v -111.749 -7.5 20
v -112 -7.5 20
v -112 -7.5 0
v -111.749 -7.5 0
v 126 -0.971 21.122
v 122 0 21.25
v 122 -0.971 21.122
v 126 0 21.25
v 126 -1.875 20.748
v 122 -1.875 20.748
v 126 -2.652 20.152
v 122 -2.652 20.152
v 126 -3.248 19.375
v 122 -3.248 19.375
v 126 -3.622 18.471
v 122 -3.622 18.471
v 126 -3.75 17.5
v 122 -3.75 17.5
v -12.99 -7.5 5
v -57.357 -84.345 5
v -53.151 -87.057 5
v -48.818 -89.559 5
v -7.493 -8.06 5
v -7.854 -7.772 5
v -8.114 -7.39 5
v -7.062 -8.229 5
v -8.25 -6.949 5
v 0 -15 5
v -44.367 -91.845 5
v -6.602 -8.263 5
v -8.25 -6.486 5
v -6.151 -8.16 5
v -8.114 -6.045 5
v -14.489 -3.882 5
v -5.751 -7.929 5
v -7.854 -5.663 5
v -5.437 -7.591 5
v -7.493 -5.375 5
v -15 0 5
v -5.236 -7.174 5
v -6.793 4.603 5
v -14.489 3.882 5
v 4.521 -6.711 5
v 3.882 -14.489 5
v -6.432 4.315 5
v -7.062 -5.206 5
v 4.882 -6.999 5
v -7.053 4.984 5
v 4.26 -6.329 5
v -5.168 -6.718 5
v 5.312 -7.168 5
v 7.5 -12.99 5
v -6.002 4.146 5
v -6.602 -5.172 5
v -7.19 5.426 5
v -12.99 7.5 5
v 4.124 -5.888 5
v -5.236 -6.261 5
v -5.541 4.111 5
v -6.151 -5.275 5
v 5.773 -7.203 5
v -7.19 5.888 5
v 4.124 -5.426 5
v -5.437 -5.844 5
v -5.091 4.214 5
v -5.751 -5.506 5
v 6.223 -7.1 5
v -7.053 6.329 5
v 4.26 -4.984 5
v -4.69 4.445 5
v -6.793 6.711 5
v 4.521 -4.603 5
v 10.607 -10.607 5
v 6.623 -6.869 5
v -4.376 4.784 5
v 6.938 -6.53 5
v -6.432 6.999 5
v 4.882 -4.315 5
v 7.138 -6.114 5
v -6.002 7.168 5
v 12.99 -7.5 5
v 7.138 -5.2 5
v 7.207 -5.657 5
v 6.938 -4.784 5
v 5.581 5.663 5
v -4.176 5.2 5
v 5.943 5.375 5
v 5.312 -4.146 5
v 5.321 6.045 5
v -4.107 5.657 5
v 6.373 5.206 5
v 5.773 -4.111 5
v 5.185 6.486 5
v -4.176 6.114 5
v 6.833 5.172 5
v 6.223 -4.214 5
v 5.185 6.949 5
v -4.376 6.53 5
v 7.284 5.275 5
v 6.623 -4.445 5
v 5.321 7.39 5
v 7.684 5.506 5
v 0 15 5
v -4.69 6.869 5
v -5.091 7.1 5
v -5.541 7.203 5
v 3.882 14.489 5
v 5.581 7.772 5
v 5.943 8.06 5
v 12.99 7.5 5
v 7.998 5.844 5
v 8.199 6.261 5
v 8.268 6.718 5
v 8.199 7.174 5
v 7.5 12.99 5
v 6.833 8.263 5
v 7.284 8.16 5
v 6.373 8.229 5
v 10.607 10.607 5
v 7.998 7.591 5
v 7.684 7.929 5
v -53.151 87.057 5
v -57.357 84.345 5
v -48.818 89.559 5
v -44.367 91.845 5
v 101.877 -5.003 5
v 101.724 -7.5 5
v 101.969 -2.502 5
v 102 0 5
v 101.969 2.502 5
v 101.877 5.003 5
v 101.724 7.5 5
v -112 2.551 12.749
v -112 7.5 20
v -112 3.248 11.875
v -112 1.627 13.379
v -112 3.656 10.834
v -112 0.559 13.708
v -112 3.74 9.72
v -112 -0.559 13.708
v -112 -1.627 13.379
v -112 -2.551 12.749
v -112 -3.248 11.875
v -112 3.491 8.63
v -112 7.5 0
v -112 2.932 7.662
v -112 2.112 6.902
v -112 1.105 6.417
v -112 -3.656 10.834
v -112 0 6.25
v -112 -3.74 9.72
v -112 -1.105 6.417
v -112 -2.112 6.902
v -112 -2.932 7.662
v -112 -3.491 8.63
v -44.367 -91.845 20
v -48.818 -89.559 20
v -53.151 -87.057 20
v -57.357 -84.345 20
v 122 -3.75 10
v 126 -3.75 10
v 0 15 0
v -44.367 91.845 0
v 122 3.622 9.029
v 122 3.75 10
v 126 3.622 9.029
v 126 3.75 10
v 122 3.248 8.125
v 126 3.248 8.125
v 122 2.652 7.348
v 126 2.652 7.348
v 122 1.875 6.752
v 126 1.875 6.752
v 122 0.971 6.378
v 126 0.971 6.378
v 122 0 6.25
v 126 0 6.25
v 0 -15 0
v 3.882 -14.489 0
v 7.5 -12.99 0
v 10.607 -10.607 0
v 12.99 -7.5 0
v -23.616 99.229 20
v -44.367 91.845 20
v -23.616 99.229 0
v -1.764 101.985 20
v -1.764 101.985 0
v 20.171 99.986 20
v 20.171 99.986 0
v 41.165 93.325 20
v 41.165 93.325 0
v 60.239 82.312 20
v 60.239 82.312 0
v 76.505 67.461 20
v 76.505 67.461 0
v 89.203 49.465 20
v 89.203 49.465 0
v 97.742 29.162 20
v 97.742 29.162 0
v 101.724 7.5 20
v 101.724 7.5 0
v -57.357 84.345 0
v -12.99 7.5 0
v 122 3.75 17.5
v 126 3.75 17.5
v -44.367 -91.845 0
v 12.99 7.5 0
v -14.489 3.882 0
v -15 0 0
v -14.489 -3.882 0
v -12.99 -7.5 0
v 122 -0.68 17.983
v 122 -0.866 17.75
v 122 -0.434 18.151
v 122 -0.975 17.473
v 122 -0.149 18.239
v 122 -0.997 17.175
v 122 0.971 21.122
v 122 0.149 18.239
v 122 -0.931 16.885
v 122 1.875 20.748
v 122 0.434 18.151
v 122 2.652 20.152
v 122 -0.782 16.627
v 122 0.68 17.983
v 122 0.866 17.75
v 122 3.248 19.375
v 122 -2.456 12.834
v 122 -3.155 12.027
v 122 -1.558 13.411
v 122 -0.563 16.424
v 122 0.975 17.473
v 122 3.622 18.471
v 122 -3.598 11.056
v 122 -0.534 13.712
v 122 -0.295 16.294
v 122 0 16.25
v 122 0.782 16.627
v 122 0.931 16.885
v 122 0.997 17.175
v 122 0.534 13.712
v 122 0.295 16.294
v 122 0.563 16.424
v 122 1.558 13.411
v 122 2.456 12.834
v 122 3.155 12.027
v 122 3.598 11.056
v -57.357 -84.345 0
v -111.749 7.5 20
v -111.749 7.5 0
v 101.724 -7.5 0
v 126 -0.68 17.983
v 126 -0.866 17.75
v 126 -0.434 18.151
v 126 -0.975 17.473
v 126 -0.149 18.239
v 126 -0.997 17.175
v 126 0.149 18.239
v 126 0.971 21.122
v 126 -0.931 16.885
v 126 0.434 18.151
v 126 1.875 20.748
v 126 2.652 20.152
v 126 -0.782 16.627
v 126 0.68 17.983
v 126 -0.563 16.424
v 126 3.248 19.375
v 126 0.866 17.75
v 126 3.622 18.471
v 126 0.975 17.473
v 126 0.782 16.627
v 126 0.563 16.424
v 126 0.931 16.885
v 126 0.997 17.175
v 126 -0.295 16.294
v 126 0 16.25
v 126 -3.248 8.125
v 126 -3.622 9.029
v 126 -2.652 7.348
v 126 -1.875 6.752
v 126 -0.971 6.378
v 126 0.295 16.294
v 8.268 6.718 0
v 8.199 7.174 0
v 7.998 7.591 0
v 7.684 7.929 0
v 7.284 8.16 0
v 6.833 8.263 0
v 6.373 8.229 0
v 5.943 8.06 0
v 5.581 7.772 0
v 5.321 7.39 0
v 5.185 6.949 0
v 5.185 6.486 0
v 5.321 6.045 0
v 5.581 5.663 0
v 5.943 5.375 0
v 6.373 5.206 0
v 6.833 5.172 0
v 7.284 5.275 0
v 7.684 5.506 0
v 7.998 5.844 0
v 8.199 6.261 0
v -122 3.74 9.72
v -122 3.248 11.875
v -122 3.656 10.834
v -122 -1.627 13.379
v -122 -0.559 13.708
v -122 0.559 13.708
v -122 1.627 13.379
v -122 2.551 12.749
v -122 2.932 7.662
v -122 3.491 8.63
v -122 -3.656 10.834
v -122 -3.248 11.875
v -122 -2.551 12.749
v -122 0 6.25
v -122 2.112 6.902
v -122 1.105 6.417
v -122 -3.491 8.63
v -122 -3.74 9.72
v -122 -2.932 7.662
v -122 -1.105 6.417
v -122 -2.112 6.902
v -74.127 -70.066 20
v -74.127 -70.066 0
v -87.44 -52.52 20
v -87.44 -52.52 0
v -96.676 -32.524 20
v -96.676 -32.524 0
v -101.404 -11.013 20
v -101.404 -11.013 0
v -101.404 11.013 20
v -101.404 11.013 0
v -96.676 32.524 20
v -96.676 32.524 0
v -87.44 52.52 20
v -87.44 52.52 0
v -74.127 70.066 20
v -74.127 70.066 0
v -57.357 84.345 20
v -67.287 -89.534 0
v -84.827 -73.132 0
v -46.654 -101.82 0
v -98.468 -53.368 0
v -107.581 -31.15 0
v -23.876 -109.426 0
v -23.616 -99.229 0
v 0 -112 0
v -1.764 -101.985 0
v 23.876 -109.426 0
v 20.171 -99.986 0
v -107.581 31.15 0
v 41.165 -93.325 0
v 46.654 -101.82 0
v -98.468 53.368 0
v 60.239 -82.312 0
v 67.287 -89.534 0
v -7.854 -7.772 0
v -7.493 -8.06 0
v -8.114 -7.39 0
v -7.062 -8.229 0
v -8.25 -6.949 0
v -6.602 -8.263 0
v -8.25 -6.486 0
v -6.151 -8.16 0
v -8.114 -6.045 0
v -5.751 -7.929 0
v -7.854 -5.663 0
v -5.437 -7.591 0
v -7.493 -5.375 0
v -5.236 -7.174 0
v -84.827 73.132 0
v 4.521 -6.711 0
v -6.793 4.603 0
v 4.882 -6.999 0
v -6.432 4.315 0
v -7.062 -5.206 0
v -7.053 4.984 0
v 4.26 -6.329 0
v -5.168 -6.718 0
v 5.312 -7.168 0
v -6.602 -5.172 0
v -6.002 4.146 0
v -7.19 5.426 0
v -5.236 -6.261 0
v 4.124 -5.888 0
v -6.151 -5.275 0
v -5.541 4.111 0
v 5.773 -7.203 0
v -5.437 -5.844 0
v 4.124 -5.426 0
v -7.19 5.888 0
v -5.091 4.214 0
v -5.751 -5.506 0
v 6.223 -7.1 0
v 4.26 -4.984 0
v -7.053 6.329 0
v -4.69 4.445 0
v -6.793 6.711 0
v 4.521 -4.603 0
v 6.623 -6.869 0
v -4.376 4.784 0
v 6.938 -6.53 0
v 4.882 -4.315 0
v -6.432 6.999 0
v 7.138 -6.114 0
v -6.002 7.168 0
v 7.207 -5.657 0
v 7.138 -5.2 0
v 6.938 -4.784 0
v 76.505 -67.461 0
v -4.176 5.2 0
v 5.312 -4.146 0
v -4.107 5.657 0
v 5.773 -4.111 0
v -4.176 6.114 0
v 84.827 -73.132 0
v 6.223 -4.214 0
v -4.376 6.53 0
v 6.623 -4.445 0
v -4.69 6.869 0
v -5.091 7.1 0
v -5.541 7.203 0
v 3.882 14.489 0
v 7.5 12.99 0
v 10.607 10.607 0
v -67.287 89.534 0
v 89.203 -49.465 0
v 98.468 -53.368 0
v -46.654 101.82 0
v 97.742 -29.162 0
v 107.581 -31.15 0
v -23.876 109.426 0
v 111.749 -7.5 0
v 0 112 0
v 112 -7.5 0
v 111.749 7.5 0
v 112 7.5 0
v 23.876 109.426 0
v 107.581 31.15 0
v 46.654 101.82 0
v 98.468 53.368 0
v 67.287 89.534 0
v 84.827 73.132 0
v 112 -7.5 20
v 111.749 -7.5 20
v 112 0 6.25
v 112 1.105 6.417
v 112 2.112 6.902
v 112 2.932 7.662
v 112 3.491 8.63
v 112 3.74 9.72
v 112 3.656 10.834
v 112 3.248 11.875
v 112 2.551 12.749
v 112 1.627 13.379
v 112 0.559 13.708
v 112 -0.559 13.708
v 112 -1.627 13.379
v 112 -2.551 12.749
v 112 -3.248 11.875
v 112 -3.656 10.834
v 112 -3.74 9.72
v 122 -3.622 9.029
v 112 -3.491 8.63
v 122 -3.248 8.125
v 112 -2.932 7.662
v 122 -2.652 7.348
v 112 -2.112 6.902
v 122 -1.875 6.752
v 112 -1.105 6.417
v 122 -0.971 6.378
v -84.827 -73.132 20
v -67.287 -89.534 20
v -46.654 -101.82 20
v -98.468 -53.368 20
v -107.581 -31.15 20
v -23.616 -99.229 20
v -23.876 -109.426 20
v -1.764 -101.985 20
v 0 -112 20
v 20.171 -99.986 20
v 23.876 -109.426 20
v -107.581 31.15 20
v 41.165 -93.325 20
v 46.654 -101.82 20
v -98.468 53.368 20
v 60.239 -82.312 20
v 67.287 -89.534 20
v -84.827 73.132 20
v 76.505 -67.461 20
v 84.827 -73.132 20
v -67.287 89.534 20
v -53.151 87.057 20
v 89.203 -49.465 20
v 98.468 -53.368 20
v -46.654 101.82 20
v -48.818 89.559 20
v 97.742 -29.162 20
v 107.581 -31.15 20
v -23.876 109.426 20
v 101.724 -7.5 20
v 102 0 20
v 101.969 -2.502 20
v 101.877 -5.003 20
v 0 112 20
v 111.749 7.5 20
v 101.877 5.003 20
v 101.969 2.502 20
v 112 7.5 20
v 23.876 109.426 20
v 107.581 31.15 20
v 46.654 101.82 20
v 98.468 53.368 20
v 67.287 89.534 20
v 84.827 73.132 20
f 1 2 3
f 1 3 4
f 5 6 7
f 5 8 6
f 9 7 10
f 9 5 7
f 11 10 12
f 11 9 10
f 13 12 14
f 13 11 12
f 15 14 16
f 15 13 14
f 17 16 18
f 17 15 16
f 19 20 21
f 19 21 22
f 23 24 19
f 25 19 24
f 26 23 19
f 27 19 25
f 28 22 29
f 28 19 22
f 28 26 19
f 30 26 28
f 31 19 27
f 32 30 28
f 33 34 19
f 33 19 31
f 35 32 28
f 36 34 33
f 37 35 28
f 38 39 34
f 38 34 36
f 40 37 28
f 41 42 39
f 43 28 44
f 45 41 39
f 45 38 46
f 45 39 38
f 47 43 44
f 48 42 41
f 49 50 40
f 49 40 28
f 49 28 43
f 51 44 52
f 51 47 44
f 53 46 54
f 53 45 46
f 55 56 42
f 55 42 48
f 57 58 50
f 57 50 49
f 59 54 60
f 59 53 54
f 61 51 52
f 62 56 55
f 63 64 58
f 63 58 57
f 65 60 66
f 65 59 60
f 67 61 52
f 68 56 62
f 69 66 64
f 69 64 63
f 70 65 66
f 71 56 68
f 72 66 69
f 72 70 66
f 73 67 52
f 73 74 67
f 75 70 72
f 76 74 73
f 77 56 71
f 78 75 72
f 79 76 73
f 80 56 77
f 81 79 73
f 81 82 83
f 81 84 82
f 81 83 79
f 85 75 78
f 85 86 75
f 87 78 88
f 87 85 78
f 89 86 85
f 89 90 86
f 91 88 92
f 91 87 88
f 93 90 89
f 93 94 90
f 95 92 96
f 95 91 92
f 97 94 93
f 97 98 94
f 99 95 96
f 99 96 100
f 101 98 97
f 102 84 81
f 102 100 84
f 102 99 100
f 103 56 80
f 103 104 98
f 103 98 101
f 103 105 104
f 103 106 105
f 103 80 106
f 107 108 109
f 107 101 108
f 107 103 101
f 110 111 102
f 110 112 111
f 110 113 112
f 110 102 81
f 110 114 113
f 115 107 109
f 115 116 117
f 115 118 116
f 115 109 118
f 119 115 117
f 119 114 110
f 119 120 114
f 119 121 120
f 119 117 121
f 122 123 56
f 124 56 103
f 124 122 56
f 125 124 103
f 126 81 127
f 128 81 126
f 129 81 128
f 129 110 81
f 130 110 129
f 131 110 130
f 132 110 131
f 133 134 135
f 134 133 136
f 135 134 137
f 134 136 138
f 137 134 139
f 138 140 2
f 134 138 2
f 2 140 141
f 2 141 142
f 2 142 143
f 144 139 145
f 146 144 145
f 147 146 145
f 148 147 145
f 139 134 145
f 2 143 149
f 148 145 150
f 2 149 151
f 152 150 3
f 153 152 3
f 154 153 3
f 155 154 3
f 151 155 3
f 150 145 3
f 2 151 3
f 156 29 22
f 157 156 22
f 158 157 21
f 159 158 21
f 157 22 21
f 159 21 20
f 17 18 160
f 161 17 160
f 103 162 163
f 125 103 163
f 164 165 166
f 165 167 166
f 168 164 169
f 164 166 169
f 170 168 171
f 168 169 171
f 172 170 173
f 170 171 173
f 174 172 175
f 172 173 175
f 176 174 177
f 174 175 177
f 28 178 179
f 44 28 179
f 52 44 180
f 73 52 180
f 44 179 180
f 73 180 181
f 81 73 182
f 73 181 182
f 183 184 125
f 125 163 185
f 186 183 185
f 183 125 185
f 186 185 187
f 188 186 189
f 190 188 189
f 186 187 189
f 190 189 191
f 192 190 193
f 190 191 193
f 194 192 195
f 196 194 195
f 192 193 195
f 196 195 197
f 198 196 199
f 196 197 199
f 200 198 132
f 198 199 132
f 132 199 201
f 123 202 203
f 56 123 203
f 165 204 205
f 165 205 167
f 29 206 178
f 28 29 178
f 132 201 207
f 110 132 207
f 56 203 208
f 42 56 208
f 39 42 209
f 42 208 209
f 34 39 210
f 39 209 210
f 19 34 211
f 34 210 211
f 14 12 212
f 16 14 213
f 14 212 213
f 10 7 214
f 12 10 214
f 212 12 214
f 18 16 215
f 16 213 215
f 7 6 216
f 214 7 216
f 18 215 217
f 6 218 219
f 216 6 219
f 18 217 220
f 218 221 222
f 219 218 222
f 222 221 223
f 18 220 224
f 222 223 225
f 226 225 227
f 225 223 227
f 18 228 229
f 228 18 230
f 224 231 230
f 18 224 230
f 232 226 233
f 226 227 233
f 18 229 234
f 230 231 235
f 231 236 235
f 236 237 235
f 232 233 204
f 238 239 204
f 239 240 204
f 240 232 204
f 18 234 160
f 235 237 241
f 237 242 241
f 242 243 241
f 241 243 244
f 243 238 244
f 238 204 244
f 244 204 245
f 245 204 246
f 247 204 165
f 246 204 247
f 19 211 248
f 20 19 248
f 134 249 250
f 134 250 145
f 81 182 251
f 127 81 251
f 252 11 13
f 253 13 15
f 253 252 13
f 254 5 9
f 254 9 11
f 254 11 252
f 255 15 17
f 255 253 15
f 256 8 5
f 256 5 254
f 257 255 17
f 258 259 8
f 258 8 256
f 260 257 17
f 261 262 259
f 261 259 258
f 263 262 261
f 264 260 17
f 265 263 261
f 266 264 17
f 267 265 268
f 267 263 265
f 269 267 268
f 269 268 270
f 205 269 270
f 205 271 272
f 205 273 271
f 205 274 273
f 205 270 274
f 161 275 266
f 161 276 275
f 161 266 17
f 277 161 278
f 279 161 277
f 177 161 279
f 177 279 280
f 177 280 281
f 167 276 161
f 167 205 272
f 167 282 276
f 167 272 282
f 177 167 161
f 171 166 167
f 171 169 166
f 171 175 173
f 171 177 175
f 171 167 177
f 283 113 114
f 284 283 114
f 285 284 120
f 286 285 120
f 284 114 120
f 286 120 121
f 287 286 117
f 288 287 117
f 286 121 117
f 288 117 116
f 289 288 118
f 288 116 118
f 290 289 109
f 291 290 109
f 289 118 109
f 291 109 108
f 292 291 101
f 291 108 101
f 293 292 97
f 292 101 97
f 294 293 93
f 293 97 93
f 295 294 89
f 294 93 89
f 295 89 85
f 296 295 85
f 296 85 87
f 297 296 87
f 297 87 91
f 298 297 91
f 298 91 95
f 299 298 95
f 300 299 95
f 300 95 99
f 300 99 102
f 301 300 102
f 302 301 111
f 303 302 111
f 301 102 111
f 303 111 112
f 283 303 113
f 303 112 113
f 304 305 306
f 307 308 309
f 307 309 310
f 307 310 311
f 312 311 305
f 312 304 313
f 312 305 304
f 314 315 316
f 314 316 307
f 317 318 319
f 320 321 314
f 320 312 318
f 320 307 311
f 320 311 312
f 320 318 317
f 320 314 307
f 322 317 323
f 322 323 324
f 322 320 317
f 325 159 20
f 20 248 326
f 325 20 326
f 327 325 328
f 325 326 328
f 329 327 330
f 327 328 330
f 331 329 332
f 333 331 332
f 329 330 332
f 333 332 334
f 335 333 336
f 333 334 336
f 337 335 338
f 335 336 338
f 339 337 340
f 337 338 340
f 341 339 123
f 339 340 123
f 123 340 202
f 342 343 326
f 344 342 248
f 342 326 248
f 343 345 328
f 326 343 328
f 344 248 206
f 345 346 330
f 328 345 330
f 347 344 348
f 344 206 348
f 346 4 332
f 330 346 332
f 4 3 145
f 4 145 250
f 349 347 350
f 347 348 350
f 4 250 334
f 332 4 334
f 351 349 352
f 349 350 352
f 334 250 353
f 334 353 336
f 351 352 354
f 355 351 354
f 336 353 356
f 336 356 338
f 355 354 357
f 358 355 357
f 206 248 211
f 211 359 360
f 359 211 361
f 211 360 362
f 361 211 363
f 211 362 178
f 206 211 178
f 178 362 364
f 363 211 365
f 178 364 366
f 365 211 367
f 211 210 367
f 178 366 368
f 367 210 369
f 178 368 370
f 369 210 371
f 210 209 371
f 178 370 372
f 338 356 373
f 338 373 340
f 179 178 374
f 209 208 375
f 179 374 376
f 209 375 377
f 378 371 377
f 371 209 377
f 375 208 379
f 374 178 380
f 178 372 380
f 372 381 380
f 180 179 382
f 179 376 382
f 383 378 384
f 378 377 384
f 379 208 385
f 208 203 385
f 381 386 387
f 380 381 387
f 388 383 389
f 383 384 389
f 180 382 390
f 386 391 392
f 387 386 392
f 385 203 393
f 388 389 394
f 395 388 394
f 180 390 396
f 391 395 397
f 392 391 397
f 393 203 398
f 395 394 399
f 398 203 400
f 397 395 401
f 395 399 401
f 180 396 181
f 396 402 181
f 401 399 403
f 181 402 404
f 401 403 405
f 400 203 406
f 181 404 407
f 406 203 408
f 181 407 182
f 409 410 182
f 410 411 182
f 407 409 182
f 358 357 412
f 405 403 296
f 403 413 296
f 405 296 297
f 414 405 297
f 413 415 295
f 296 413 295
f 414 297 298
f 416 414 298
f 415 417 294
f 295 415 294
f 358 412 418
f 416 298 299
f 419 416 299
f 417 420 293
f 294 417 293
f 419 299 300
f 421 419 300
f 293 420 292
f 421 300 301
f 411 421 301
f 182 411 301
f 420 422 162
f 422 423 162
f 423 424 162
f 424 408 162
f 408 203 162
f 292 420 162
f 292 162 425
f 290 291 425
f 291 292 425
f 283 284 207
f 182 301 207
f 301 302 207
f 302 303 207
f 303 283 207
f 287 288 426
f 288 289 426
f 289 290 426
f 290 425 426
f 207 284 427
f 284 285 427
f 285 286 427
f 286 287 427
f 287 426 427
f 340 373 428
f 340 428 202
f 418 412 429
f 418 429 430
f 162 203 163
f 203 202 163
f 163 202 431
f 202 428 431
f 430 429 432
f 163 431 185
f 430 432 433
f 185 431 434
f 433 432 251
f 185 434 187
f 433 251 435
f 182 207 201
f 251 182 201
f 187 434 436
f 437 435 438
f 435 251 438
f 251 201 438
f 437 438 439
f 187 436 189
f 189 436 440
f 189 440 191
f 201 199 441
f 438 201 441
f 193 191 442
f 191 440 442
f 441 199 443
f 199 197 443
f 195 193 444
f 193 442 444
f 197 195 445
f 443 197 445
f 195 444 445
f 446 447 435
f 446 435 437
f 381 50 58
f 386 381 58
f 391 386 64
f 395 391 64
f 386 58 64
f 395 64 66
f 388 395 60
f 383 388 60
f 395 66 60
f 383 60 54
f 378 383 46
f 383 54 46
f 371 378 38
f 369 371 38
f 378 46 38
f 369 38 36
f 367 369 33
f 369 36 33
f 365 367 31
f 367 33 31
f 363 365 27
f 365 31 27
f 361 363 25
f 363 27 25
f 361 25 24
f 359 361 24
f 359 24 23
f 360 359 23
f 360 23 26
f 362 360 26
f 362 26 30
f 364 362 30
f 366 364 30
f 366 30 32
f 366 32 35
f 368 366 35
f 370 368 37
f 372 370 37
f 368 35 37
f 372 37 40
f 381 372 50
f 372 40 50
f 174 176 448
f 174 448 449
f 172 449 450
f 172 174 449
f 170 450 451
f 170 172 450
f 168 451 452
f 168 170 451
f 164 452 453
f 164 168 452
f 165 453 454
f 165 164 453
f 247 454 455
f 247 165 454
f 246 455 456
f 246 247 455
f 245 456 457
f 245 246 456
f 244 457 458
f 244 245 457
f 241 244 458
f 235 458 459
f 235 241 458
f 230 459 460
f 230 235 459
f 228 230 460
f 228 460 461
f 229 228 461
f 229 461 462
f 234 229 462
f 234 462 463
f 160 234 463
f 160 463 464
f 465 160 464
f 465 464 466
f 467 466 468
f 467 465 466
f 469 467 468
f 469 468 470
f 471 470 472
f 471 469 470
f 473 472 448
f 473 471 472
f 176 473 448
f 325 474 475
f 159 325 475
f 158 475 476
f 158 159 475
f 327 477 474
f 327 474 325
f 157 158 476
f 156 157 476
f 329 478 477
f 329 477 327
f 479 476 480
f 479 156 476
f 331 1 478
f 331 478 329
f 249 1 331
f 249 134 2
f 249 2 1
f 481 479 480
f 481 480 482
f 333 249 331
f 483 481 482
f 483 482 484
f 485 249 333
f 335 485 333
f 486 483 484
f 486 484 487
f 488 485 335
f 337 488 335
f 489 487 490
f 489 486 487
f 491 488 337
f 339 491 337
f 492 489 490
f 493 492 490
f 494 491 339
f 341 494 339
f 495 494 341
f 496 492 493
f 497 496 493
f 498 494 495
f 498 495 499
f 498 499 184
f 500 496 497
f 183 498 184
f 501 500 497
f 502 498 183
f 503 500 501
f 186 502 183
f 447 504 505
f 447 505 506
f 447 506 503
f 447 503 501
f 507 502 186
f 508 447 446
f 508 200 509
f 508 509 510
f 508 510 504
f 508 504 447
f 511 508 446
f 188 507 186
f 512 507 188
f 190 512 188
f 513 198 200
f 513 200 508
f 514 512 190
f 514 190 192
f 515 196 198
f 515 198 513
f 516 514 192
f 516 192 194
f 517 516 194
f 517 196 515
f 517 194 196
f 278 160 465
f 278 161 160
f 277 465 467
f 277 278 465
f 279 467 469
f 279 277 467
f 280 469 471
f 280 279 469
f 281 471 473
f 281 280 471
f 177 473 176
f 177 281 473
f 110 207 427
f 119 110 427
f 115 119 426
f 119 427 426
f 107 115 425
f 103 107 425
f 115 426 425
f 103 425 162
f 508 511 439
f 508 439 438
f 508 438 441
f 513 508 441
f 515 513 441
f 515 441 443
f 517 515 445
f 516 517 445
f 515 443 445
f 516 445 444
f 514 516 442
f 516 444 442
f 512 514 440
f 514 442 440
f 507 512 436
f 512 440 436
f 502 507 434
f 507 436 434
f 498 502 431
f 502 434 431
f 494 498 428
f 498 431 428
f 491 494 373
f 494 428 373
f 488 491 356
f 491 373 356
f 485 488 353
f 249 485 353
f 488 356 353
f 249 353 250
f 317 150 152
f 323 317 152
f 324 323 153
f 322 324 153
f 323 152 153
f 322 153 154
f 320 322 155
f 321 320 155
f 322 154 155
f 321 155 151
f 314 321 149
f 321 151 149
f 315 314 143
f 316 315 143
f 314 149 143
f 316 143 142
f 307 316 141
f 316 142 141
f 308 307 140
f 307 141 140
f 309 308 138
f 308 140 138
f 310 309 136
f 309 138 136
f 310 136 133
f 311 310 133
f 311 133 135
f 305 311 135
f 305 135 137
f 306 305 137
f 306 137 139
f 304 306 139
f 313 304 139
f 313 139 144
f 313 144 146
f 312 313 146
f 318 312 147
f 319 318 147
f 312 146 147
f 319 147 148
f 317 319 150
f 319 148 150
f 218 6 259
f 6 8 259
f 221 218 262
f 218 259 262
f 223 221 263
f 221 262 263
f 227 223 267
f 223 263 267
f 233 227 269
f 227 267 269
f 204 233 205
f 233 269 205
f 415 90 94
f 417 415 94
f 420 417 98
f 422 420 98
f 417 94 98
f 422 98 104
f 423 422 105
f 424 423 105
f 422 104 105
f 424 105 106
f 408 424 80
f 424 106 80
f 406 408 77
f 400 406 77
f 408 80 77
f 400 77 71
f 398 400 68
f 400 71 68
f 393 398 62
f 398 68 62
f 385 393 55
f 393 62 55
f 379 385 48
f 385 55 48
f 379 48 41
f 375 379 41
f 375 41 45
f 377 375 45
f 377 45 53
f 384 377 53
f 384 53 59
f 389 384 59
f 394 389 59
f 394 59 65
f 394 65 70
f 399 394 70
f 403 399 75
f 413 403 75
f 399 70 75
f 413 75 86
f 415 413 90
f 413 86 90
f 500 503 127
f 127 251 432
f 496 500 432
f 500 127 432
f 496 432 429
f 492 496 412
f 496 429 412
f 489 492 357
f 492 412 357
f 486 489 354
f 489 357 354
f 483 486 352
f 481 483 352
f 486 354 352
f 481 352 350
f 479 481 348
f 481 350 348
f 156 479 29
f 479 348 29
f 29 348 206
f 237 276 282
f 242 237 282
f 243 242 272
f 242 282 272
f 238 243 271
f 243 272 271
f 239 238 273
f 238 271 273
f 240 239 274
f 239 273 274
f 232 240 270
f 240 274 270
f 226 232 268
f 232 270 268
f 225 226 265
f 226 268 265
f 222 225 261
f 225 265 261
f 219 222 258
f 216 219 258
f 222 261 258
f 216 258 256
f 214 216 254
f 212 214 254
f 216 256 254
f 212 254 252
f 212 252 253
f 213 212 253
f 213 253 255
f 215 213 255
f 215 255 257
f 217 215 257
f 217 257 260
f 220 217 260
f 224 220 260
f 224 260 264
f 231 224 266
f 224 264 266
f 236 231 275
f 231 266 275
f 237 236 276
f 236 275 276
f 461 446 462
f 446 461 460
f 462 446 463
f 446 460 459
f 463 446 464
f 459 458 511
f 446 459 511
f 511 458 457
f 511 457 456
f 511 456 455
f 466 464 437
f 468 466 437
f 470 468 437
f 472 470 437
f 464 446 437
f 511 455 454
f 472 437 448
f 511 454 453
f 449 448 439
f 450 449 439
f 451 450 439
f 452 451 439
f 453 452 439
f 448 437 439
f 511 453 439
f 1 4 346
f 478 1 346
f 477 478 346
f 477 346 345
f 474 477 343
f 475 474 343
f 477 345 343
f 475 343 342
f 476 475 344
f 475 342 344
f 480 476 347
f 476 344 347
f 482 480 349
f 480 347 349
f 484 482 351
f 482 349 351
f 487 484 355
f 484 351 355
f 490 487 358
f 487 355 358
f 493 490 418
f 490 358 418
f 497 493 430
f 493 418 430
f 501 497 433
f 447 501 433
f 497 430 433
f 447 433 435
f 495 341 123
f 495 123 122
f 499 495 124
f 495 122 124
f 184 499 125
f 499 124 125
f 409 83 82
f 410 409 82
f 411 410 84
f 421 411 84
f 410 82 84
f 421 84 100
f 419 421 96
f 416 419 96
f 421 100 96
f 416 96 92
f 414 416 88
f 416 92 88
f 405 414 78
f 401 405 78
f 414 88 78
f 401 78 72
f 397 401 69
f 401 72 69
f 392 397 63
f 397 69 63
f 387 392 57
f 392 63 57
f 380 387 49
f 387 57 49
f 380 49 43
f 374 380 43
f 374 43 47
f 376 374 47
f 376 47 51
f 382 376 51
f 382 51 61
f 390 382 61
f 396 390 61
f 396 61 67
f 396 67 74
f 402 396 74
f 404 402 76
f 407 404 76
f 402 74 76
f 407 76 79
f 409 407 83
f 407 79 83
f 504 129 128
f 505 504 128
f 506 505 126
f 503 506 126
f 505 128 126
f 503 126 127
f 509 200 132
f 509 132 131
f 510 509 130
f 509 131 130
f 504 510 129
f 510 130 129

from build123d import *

# Parameters (mm, degrees)
BOSS_EXTRUDE1_DEPTH = 20
SKETCH1_3_R         = 15
BOSS_EXTRUDE2_DEPTH = 5
SKETCH2_R           = 1.55
CUT_EXTRUDE1_DEPTH  = 5
SKETCH4_R           = 3.75
BOSS_EXTRUDE3_DEPTH = 10
BOSS_EXTRUDE4_START = 10
SKETCH3_R           = 3.75
BOSS_EXTRUDE4_DEPTH = 10
SKETCH5_W           = 15
SKETCH5_H           = 7.5
BOSS_EXTRUDE5_DEPTH = 4
FILLET2_R           = 3.75
SKETCH6_R           = 1
CUT_EXTRUDE2_DEPTH  = 4


with BuildPart() as part:
    # Sketch1 → Boss-Extrude1 (new body)
    with BuildSketch(Plane.XY):
        with BuildLine():
            Line((112, 7.5), (111.748601781, 7.5))
            ThreePointArc((111.748601781, 7.5), (0, 112), (-111.748601781, 7.5))
            Line((-111.748601781, 7.5), (-112, 7.5))
            Line((-112, 7.5), (-112, -7.5))
            Line((-112, -7.5), (-111.748601781, -7.5))
            ThreePointArc((-111.748601781, -7.5), (0, -112), (111.748601781, -7.5))
            Line((111.748601781, -7.5), (112, -7.5))
            Line((112, -7.5), (112, 7.5))
        make_face()
        with BuildLine():
            ThreePointArc((102, 0), (101.930949377, -3.752540346), (101.723890999, -7.5))
            ThreePointArc((101.723890999, -7.5), (51, -88.334591186), (-44.366754971, -91.845473777))
            ThreePointArc((-44.366754971, -91.845473777), (-51, -88.334591186), (-57.357136028, -84.345473777))
            ThreePointArc((-57.357136028, -84.345473777), (-102, 0), (-57.357136028, 84.345473777))
            ThreePointArc((-57.357136028, 84.345473777), (-51, 88.334591186), (-44.366754971, 91.845473777))
            ThreePointArc((-44.366754971, 91.845473777), (51, 88.334591186), (101.723890999, 7.5))
            ThreePointArc((101.723890999, 7.5), (101.930949377, 3.752540346), (102, 0))
        make_face(mode=Mode.SUBTRACT)
    extrude(amount=BOSS_EXTRUDE1_DEPTH)

    # Sketch1<3> → Boss-Extrude2 (add)
    with BuildSketch(Plane.XY):
        with BuildLine():
            Line((-57.357136028, 84.345473777), (-12.990381057, 7.5))
            ThreePointArc((-12.990381057, 7.5), (-7.5, 12.990381057), (0, 15))
            Line((0, 15), (-44.366754971, 91.845473777))
            ThreePointArc((-44.366754971, 91.845473777), (-51, 88.334591186), (-57.357136028, 84.345473777))
        make_face()
        Circle(SKETCH1_3_R)
        with BuildLine():
            Line((-44.366754971, -91.845473777), (0, -15))
            ThreePointArc((0, -15), (-7.5, -12.990381057), (-12.990381057, -7.5))
            Line((-12.990381057, -7.5), (-57.357136028, -84.345473777))
            ThreePointArc((-57.357136028, -84.345473777), (-51, -88.334591186), (-44.366754971, -91.845473777))
        make_face()
        with BuildLine():
            ThreePointArc((15, 0), (14.488887394, -3.882285677), (12.990381057, -7.5))
            Line((12.990381057, -7.5), (101.723890999, -7.5))
            ThreePointArc((101.723890999, -7.5), (101.930949377, -3.752540346), (102, 0))
            ThreePointArc((102, 0), (101.930949377, 3.752540346), (101.723890999, 7.5))
            Line((101.723890999, 7.5), (12.990381057, 7.5))
            ThreePointArc((12.990381057, 7.5), (14.488887394, 3.882285677), (15, 0))
        make_face()
    extrude(amount=BOSS_EXTRUDE2_DEPTH)

    # Sketch2 → Cut-Extrude1 (cut)
    with BuildSketch(Plane.XY.offset(5)):
        with Locations((-5.656854249, 5.656854249)):
            Circle(SKETCH2_R)
        with Locations((6.717514421, 6.717514421)):
            Circle(SKETCH2_R)
        with Locations((5.656854249, -5.656854249)):
            Circle(SKETCH2_R)
        with Locations((-6.717514421, -6.717514421)):
            Circle(SKETCH2_R)
    extrude(amount=-CUT_EXTRUDE1_DEPTH, mode=Mode.SUBTRACT)

    # Sketch4 → Boss-Extrude3 (add)
    with BuildSketch(Plane.ZY.offset(112)):
        with Locations(Location((10, 0, 0), (0, 0, 180))):
            Circle(SKETCH4_R)
    extrude(amount=BOSS_EXTRUDE3_DEPTH)

    # Sketch3 → Boss-Extrude4 (add)
    with BuildSketch(Plane(origin=(112, 0, 0), x_dir=(0, 0, -1), z_dir=(1, 0, 0)).offset(BOSS_EXTRUDE4_START)):
        with Locations((-10, 0)):
            Circle(SKETCH3_R)
    extrude(amount=-BOSS_EXTRUDE4_DEPTH)

    # Sketch5 → Boss-Extrude5 (add)
    with BuildSketch(Plane(origin=(122, 0, 0), x_dir=(0, 0, -1), z_dir=(1, 0, 0))):
        with Locations((-13.75, 0)):
            Rectangle(SKETCH5_W, SKETCH5_H)
    extrude(amount=BOSS_EXTRUDE5_DEPTH)

    # Fillet2
    fillet2_edges = [part.edges().sort_by_distance(p)[0] for p in [
        (124, -3.75, 21.25),
        (124, 3.75, 21.25),
        (124, 3.75, 6.25),
        (124, -3.75, 6.25),
    ]]
    fillet(fillet2_edges, radius=FILLET2_R - 0.0001)  # a hair under: the kernel refuses the full size

    # Sketch6 → Cut-Extrude2 (cut)
    with BuildSketch(Plane(origin=(126, 0, 0), x_dir=(0, 0, -1), z_dir=(1, 0, 0))):
        with Locations((-17.25, 0)):
            Circle(SKETCH6_R)
    extrude(amount=-CUT_EXTRUDE2_DEPTH, mode=Mode.SUBTRACT)


solid = part.part
